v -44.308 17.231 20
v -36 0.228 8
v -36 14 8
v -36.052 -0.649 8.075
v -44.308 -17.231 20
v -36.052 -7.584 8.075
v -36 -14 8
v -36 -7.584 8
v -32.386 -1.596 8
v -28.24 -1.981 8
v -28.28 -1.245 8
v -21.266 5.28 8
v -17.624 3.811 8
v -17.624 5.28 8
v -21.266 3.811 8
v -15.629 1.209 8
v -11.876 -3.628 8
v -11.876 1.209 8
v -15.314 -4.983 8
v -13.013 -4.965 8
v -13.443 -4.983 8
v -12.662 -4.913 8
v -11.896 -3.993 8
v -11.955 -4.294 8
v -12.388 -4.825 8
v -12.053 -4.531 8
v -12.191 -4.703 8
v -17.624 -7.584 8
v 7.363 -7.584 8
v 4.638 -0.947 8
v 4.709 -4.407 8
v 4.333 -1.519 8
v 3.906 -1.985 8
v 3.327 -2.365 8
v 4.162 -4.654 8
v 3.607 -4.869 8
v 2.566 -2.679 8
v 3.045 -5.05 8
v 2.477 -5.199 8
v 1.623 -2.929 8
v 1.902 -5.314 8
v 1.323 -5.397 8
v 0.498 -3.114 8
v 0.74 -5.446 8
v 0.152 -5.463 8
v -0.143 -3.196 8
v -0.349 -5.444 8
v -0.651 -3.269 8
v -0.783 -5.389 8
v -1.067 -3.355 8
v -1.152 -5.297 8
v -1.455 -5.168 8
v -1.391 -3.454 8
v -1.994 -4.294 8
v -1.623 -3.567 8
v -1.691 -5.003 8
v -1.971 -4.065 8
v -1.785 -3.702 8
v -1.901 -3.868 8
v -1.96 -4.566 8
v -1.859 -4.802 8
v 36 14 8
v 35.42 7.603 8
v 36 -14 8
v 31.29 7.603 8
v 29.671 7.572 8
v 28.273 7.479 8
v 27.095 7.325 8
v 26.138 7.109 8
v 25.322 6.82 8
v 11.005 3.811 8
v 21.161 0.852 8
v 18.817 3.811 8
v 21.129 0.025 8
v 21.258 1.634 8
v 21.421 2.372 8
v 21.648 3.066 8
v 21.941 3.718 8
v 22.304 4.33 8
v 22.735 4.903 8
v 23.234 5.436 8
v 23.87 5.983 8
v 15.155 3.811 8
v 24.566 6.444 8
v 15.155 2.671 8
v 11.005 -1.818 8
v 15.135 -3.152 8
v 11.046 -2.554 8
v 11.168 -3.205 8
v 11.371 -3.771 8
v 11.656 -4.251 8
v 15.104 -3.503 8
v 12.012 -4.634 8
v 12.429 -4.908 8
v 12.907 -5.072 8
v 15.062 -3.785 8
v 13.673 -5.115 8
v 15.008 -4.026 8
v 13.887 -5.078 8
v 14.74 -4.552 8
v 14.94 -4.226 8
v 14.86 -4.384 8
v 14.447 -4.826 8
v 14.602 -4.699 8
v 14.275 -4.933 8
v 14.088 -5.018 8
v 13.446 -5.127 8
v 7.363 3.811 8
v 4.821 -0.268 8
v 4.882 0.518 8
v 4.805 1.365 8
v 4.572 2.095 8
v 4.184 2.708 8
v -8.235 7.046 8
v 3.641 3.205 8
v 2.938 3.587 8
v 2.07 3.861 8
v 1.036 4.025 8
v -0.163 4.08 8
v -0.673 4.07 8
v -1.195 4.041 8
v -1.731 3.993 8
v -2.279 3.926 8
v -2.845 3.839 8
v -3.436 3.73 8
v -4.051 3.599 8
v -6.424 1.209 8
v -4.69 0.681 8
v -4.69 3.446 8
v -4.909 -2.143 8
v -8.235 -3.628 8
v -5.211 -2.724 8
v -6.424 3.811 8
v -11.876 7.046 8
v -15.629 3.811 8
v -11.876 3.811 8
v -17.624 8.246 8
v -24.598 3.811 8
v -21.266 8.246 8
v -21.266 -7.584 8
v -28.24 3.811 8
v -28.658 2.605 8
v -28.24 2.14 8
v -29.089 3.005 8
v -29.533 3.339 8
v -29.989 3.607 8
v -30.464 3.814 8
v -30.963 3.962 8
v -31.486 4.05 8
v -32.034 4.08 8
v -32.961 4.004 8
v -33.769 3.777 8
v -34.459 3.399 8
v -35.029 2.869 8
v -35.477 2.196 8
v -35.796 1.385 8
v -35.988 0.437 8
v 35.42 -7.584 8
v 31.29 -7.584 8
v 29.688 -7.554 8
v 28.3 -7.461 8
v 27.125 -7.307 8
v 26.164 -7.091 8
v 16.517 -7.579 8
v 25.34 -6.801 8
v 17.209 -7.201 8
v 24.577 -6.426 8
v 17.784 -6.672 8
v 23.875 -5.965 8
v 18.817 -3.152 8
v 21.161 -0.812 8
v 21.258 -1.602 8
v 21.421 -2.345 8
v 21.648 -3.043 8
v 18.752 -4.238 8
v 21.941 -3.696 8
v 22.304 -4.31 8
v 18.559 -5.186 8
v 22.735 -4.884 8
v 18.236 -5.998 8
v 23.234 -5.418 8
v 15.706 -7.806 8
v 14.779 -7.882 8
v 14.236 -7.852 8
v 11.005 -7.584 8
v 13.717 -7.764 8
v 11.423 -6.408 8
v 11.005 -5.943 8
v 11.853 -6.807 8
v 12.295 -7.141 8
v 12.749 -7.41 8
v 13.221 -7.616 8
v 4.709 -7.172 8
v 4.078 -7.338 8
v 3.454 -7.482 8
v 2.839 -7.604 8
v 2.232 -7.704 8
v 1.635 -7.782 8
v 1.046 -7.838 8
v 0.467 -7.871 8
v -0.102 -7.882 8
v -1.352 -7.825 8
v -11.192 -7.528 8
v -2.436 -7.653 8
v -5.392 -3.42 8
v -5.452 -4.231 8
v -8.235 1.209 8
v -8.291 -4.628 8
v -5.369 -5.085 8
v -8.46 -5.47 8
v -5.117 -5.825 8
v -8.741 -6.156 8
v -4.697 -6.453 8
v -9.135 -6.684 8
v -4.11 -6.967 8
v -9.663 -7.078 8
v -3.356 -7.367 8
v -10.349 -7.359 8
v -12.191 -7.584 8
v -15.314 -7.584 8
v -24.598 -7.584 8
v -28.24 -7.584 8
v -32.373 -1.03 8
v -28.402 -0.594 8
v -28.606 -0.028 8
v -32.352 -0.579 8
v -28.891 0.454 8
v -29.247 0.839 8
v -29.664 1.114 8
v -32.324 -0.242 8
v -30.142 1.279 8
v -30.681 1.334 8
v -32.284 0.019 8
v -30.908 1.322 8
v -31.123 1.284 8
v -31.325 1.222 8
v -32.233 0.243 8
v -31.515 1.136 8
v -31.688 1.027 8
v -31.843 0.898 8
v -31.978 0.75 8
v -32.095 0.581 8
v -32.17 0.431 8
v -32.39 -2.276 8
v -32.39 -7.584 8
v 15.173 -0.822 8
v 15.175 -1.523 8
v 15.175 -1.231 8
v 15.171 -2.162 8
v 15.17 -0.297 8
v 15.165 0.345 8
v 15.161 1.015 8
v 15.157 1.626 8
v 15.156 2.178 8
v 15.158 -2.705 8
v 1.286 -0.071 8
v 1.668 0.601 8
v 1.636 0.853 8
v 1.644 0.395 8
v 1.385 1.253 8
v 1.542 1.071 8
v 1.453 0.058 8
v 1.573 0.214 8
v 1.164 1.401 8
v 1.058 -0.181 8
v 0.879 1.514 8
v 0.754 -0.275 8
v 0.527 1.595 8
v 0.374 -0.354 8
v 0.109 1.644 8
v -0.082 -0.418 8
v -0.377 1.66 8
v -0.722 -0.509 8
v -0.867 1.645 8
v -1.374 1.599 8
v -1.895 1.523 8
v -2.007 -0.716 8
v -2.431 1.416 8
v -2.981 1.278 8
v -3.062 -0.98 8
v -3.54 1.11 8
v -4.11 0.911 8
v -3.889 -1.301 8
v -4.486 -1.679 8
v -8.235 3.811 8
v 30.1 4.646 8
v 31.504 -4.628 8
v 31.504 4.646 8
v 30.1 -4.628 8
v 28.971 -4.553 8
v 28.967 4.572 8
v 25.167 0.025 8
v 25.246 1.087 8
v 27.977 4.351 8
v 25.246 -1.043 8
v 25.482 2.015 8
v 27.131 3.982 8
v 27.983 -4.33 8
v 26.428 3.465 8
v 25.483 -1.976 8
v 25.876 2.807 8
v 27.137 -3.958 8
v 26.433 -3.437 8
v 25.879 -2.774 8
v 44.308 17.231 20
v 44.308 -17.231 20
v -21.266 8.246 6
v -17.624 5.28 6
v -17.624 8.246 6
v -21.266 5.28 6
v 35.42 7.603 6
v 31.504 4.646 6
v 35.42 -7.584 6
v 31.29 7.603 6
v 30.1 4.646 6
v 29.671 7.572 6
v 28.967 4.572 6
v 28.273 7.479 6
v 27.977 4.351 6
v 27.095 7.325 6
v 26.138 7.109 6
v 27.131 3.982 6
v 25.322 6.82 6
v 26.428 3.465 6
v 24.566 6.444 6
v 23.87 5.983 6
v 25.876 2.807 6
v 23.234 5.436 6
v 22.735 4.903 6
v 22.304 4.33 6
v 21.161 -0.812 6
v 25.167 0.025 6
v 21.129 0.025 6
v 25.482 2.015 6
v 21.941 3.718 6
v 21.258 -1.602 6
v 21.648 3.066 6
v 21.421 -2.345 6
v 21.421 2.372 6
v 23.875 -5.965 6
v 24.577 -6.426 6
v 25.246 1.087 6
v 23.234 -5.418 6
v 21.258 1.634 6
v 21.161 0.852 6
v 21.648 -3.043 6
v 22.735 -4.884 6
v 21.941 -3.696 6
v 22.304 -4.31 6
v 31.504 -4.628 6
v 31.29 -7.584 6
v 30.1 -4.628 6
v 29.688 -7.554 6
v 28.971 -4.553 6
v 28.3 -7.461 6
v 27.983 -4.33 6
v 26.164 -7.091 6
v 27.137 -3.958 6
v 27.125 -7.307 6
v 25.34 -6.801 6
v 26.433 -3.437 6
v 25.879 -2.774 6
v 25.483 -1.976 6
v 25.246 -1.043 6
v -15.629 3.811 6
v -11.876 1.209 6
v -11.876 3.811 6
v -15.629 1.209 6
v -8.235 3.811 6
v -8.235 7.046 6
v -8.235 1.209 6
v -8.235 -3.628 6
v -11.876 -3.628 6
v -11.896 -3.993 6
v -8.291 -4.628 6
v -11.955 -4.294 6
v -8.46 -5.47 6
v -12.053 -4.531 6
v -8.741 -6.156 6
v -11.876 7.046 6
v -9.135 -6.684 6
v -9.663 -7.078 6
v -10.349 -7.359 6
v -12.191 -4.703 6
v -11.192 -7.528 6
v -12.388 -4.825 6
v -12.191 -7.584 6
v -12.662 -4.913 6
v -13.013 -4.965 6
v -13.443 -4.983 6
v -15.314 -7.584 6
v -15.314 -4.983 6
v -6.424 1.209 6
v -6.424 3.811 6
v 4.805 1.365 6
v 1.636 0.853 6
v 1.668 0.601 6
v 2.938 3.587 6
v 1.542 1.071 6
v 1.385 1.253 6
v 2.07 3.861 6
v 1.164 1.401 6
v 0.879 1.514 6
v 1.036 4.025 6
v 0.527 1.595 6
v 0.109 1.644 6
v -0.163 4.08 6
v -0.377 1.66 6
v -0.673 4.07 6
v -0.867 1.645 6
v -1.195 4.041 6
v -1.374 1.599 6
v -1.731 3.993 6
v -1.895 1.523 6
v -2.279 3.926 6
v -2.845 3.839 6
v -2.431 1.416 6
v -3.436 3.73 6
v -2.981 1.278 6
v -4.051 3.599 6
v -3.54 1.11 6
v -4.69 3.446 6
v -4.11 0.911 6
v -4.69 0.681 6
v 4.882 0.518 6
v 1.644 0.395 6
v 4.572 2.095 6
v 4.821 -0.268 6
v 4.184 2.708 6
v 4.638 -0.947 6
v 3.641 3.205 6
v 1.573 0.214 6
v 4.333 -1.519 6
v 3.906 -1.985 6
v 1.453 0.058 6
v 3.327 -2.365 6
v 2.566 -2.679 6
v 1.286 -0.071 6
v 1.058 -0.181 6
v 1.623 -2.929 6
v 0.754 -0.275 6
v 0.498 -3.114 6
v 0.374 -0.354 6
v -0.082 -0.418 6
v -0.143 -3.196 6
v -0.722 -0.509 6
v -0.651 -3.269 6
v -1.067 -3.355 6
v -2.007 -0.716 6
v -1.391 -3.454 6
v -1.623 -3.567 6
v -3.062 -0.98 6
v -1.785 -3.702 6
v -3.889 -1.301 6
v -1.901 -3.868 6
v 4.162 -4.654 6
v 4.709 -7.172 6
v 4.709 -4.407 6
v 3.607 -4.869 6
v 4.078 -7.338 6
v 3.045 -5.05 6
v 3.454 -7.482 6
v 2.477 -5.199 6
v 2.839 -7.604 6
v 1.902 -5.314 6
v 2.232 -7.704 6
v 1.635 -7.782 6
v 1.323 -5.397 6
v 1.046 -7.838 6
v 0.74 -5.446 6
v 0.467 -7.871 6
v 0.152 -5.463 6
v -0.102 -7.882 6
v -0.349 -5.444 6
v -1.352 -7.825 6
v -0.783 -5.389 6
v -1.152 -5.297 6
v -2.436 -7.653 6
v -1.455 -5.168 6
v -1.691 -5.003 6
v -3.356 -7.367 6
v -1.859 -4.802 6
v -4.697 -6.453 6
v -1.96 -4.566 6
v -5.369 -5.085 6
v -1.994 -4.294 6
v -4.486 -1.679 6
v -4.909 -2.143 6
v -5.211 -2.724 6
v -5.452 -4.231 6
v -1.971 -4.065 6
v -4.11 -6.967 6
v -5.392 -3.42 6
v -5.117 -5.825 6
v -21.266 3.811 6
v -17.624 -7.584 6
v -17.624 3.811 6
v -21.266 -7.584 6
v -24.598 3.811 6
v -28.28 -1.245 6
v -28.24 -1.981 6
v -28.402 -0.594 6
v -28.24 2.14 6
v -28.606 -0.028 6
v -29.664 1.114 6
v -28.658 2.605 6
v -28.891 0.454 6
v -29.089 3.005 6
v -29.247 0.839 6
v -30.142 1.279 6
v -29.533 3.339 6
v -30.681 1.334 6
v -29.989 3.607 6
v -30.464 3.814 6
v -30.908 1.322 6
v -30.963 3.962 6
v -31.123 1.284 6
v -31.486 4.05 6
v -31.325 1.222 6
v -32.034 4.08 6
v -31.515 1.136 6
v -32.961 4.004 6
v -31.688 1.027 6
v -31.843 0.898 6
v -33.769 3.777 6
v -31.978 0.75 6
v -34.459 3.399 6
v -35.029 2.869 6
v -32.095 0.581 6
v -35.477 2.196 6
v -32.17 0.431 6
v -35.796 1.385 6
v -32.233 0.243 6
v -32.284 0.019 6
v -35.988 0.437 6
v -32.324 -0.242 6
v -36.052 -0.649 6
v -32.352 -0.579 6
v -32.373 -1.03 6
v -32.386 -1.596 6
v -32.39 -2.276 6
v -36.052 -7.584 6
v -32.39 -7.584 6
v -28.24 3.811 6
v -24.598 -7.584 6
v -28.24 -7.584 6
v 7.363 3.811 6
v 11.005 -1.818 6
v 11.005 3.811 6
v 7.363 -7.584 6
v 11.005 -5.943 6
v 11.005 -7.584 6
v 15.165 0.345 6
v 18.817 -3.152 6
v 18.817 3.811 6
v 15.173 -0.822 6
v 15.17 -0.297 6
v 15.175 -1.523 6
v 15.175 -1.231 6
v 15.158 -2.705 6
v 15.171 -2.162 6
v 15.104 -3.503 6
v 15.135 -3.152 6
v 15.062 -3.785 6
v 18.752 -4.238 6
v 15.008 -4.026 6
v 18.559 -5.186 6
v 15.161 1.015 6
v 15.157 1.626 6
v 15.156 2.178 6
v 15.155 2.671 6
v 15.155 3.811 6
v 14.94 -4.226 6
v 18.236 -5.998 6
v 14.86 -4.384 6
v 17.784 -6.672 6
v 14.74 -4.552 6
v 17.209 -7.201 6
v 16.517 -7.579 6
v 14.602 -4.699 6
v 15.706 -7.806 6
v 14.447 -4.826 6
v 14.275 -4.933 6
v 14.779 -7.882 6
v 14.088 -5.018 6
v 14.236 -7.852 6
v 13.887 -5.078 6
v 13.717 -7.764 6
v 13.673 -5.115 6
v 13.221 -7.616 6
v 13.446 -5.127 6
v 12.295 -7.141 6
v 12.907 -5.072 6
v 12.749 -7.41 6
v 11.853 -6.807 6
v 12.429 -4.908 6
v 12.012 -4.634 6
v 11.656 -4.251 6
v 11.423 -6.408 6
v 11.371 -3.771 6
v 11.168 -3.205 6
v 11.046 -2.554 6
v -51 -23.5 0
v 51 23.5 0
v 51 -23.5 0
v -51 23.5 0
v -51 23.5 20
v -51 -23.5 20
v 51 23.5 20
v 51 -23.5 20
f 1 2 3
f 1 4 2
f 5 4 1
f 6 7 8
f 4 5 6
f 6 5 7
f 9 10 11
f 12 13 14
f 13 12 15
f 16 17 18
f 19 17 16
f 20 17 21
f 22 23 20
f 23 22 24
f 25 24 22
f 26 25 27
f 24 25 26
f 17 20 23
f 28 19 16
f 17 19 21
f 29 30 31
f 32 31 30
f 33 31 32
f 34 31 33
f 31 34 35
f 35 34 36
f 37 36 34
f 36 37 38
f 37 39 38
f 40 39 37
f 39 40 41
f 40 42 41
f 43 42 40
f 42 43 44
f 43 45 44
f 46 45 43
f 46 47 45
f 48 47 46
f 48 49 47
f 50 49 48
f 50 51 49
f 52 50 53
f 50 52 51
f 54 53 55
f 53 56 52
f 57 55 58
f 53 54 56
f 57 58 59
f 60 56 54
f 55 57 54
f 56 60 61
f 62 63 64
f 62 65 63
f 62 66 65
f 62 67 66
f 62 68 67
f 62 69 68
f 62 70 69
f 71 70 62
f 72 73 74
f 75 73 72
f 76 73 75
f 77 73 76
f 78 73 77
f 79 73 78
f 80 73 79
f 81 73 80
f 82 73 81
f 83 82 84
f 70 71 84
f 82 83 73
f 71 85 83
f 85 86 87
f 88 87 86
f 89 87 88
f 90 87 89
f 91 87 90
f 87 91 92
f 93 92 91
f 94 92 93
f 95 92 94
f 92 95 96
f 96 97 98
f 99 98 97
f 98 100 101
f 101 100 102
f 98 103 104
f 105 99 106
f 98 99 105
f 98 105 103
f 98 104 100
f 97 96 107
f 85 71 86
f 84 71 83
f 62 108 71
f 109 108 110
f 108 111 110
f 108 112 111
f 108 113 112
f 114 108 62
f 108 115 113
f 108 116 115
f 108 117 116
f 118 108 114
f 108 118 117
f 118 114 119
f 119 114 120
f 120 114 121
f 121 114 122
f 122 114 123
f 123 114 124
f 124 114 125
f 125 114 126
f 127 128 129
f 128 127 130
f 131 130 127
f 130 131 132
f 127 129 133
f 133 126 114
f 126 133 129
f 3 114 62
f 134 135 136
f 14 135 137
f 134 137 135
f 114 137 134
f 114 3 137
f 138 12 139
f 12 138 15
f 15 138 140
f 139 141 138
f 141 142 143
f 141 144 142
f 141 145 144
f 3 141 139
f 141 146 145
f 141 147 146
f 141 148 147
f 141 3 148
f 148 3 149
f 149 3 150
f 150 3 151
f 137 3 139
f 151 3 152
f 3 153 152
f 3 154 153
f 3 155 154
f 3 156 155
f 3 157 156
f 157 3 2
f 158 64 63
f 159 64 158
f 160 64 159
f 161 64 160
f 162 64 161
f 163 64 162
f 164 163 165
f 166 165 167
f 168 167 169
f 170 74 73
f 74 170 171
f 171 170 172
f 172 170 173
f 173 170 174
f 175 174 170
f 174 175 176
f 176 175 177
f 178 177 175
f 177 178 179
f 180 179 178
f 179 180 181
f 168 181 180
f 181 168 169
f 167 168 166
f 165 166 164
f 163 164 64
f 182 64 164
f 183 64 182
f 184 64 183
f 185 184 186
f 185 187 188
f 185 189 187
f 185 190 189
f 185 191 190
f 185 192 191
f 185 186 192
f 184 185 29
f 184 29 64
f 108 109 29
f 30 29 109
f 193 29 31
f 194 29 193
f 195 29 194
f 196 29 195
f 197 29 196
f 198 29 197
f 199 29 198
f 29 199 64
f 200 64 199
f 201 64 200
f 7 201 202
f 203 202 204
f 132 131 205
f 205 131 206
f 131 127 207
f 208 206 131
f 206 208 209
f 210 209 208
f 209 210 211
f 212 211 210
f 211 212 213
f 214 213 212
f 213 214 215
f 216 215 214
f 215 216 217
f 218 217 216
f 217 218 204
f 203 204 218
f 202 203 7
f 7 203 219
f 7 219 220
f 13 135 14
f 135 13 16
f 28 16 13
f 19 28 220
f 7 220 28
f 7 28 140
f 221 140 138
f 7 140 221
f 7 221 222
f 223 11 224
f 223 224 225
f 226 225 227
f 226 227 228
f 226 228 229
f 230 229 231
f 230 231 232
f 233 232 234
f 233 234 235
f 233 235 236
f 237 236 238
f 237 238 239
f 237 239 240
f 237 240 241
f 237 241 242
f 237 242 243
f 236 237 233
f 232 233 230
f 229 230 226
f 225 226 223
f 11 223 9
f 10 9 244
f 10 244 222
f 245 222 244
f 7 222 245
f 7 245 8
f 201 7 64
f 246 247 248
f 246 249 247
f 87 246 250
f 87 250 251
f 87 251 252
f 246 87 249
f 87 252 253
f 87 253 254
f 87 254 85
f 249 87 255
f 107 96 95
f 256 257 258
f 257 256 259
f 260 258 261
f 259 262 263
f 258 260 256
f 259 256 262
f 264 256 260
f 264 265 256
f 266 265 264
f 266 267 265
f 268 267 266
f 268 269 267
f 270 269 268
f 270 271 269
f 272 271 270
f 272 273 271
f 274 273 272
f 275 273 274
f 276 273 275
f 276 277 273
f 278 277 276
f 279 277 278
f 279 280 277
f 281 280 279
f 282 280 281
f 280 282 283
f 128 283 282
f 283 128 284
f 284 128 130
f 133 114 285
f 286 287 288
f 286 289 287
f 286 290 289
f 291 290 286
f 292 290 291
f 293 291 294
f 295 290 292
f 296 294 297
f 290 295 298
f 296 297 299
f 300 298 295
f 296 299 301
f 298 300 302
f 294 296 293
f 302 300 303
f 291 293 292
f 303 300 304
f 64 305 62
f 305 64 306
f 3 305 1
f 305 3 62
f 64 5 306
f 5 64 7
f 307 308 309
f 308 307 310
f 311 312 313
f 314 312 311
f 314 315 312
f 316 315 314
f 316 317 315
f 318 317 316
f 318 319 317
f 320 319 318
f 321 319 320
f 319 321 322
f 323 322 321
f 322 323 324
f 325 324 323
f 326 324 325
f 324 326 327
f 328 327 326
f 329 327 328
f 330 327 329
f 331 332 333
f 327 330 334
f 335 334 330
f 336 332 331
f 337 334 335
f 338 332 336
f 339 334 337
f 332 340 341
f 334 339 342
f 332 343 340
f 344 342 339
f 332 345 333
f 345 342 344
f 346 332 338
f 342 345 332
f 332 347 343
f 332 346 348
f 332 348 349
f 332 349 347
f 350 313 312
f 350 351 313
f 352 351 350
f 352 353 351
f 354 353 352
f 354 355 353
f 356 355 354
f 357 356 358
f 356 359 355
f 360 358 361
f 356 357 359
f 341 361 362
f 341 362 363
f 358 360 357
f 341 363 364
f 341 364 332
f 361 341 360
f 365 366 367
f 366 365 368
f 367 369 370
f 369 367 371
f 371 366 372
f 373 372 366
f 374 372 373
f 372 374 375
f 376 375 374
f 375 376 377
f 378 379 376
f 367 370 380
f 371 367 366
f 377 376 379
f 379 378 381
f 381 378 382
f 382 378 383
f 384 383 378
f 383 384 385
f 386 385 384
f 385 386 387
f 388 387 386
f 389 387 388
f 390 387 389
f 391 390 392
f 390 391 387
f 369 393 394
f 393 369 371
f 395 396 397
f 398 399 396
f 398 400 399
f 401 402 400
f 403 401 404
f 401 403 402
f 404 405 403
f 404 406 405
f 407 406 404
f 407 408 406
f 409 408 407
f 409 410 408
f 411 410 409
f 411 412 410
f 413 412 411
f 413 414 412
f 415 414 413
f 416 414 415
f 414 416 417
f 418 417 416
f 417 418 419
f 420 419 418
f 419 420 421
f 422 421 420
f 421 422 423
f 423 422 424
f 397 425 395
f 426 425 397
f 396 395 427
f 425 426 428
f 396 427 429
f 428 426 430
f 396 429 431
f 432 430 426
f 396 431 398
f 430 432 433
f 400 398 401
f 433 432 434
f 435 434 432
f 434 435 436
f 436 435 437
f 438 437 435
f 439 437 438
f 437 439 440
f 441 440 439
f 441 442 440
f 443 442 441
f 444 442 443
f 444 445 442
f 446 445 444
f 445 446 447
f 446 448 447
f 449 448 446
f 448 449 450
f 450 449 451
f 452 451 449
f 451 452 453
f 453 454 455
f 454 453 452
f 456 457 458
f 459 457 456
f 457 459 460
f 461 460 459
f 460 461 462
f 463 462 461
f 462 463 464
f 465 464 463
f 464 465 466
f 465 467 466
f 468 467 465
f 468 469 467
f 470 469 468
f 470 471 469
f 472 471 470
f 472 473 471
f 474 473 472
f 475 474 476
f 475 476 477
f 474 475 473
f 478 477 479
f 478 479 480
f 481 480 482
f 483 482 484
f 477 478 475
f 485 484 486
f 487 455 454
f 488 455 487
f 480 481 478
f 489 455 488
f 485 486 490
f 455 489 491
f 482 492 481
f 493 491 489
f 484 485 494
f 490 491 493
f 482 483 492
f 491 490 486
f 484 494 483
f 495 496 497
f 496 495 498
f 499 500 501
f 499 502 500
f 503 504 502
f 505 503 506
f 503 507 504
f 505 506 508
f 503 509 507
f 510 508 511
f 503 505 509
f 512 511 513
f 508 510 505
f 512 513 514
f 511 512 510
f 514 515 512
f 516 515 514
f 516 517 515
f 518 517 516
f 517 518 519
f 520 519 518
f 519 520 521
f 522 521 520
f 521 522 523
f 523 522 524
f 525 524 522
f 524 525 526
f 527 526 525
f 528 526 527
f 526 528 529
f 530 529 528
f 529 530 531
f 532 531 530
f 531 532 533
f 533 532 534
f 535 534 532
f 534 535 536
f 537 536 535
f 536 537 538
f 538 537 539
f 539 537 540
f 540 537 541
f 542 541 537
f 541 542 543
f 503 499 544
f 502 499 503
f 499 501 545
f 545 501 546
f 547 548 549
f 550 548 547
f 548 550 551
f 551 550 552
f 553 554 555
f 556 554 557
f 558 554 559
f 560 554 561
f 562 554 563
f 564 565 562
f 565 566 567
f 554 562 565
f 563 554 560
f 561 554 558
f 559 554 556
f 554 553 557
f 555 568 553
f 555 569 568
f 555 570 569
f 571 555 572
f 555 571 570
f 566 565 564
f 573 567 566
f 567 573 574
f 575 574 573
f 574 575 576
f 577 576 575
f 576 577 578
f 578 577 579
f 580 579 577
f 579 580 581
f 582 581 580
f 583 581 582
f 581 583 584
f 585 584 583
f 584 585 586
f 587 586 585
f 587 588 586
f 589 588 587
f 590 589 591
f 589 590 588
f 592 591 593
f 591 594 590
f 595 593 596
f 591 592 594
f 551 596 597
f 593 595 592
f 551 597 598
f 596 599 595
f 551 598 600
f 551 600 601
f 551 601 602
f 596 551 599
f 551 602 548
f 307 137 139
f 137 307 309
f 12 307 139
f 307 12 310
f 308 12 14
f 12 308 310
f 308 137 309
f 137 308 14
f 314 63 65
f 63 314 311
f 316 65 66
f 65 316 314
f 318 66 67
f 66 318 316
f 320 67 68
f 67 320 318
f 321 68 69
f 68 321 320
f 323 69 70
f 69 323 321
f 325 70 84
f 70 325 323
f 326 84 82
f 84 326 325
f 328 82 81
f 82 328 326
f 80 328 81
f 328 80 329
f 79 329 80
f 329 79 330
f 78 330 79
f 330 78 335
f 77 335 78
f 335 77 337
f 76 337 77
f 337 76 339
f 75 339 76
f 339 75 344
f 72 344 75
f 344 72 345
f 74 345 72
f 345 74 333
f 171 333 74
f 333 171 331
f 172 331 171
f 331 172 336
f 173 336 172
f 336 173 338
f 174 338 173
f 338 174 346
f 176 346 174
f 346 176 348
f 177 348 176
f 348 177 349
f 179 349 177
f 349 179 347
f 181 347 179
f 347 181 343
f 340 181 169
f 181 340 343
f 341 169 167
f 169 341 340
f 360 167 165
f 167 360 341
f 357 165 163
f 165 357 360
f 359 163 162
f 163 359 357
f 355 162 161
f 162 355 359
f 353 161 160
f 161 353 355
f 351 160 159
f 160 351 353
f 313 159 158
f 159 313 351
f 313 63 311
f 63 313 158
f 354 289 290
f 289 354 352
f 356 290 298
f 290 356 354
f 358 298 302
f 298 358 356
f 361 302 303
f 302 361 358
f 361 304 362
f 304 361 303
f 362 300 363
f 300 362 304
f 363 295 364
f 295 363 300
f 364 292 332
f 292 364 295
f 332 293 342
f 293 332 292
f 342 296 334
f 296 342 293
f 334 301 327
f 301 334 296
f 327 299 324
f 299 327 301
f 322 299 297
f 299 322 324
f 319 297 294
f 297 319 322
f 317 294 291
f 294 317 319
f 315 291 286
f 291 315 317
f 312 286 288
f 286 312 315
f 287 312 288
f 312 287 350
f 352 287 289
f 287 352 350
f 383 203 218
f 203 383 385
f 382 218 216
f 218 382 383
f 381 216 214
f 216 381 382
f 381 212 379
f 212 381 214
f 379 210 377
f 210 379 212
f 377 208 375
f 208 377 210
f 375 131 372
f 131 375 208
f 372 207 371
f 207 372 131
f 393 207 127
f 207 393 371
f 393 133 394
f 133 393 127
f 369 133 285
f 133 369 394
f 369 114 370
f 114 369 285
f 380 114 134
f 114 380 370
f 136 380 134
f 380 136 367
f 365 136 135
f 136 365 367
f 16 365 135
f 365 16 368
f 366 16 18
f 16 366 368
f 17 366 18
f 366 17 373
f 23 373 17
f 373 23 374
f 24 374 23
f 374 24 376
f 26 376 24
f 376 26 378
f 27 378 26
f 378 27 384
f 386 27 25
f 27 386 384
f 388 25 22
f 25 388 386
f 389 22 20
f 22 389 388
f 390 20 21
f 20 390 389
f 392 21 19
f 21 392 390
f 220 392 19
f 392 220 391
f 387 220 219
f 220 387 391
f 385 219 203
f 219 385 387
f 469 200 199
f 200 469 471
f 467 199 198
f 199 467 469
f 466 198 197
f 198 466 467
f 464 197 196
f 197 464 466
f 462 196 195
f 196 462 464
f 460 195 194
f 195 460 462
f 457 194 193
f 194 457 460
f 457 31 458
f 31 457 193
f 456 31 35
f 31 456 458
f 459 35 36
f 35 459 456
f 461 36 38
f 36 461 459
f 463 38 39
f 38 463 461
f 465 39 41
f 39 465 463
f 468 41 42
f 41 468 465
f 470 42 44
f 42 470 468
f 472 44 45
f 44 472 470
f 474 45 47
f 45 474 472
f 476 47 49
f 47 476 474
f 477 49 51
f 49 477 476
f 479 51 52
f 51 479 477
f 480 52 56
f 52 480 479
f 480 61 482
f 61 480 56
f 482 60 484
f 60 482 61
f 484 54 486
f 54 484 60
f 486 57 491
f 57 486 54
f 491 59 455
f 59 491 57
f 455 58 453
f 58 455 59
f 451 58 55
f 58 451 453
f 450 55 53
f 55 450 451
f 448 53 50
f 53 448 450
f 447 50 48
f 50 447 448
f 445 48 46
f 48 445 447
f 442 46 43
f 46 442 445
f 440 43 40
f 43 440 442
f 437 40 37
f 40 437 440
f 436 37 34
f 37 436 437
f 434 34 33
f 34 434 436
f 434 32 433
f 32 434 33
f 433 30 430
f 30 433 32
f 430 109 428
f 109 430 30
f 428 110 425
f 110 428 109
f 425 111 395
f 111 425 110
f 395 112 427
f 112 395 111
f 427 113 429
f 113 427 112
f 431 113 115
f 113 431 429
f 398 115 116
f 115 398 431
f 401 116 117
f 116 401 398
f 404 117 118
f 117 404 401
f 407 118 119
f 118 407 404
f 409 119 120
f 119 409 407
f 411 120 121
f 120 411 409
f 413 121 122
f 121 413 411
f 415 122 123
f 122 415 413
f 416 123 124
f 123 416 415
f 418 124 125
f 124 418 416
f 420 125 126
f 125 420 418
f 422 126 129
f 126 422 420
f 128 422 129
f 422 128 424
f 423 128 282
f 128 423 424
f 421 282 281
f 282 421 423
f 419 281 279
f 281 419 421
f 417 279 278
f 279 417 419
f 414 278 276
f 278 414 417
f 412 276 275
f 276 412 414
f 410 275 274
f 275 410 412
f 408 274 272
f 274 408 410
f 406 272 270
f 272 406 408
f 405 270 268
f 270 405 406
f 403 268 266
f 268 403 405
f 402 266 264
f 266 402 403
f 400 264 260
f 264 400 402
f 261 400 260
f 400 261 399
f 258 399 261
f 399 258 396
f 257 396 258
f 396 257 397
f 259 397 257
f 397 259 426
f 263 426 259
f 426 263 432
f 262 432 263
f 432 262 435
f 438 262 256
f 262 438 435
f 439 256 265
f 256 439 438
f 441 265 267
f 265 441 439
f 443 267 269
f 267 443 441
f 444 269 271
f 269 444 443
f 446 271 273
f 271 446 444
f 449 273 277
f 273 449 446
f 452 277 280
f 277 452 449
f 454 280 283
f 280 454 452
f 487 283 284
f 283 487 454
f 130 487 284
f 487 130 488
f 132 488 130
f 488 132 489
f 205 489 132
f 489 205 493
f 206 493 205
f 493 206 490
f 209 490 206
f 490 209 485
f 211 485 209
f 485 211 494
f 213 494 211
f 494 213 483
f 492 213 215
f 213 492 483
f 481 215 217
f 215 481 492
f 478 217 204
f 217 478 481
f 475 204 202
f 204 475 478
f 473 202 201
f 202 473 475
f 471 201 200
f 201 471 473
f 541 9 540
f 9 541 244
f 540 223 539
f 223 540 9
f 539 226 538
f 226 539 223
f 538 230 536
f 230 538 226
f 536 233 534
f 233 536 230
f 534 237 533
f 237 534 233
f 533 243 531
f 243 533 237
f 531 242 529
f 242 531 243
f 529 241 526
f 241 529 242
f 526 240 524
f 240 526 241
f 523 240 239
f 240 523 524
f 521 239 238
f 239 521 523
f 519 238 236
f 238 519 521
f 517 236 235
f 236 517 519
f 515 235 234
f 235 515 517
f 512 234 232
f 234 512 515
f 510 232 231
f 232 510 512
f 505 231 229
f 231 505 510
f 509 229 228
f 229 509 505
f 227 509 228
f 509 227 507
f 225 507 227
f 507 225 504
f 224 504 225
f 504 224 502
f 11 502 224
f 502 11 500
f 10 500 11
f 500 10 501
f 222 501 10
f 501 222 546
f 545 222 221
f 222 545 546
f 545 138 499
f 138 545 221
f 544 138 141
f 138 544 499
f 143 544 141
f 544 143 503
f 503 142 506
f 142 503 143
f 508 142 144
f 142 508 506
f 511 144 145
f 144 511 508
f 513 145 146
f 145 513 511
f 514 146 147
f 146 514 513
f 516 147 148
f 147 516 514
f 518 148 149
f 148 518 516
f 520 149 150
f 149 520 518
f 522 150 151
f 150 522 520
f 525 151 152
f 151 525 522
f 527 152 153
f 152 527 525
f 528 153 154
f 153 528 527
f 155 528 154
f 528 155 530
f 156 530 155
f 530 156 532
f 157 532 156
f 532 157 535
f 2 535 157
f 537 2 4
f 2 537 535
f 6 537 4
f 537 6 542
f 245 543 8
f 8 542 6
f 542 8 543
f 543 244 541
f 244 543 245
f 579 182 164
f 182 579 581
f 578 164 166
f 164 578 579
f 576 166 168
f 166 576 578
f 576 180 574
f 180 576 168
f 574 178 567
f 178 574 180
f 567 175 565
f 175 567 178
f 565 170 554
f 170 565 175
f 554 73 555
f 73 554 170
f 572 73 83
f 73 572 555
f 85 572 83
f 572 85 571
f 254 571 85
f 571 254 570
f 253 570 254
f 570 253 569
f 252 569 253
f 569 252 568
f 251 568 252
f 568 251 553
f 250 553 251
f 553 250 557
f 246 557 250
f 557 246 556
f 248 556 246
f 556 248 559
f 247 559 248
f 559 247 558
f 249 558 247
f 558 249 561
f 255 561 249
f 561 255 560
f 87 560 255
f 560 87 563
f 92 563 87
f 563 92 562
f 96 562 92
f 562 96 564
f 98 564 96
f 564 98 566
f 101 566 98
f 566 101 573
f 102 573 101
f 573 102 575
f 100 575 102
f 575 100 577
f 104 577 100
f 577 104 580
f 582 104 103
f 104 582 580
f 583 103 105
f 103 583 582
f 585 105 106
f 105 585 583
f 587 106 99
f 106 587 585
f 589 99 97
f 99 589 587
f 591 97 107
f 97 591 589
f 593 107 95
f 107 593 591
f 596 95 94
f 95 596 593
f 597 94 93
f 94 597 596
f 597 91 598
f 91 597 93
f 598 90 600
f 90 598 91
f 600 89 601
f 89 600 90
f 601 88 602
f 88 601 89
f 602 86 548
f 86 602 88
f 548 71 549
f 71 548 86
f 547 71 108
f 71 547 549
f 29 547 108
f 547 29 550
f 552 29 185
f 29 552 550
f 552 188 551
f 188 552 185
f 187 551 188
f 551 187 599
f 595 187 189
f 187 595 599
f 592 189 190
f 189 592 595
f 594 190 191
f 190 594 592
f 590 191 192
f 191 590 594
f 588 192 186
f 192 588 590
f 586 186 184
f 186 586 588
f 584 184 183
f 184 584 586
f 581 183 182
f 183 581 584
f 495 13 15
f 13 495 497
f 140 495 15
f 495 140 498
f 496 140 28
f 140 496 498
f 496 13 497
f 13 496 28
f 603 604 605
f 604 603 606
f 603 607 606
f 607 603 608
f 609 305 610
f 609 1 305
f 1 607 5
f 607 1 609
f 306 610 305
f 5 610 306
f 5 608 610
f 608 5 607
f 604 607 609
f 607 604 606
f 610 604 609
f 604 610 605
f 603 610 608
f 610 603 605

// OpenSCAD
labelString = "Dustin";
fast        = 1;   // [0:Smoothed Text, 1:Fast Render]
pourHeight  = 35;  // [5:1:200]
pourWidth   = 90;  // [5:1:300]
pourThick   = 12;  // [1:1:150]
taper       = 0.8; // [0.1:0.01:1.0]
labelDepth  = 2;   // [0.5:0.1:25]
labelSmooth = 0.5; // [0.2:0.1:2.0]
fontSize    = 15;  // [2:1:80]
moldWall    = 6;   // [1:1:12]
moldWidth   = pourWidth  + moldWall*2;
moldHeight  = pourHeight + moldWall*2;
floorThick  = moldWall   + labelDepth;
moldThick   = pourThick  + floorThick;
texDepth    = 2*1;
texLine     = 1*1;
texC2C      = 8*1;
texWidth    = texC2C/sin(60)-texLine;
extra       = 1*1;

difference()
  { moldBlock();
    union()
      { pourCavity();
        if ( fast > 0.5 )
          fastLetters();
        if ( fast <= 0.5 )
          { letters();
            texture();
          }
      }
  }

module pourCavity()
{ translate( [0,0,floorThick] )
    linear_extrude( height=pourThick+extra, scale=1/taper )
      translate( [-pourWidth*taper/2,-pourHeight*taper/2] )
        square( [pourWidth*taper,pourHeight*taper] );
}

module moldBlock()
{ translate( [-moldWidth/2,-moldHeight/2] )
    linear_extrude( moldThick )
      square( [moldWidth,moldHeight] );
}

module letters()
{ font1 = "Baloo Bhai:style=Bold"; // here you can select other font type
  $fn=8;
  translate( [0,0,moldWall] )
    minkowski()
      { linear_extrude( height=(labelDepth+extra-labelSmooth) )
          fillet( labelSmooth )
            rounding( labelSmooth )
              rotate( [0,180,0] )
                text( labelString, font = font1, size = fontSize, direction = "ltr", spacing = 1, halign="center", valign="center" );
          
        sphere( labelSmooth );
      }
}

module fastLetters()
{ font1 = "Baloo Bhai:style=Bold"; // here you can select other font type
  translate( [0,0,moldWall] )
    linear_extrude( height=(labelDepth+extra-labelSmooth) )
      rotate( [0,180,0] )
        text( labelString, font = font1, size = fontSize, direction = "ltr", spacing = 1, halign="center", valign="center" );
}

// Waffle like cuts to make removal from build plate easier
module texture()
{ wid = moldWidth;
  hei = moldHeight;
  translate( [-wid/2,-hei/2] )
  {  
  vo = sin(60)*2;
  for ( i = [wid/2:texC2C:wid] )
    for ( j = [0:texC2C*vo:hei+texC2C*vo] )
      translate( [i,j,0] )
        textureCone( texDepth );
  for ( i = [wid/2+texC2C/2:texC2C:wid] )
    for ( j = [texC2C*vo/2:texC2C*vo:hei+texC2C*vo] )
      translate( [i,j,0] )
        textureCone( texDepth );
    
  for ( i = [wid/2:-texC2C:0] )
    for ( j = [0:texC2C*vo:hei+texC2C*vo] )
      translate( [i,j,0] )
        textureCone( texDepth );
  for ( i = [wid/2-texC2C/2:-texC2C:0] )
    for ( j = [texC2C*vo/2:texC2C*vo:hei+texC2C*vo] )
      translate( [i,j,0] )
        textureCone( texDepth );
  }
}

module textureCone( h=1 )
{ translate( [0,0,-0.001] )
    linear_extrude( height=h,scale=0.5 )
      polygon(points=[[cos(030)*texWidth/2,sin(030)*texWidth/2 ],
                      [cos(090)*texWidth/2,sin(090)*texWidth/2 ],
                      [cos(150)*texWidth/2,sin(150)*texWidth/2 ],
                      [cos(210)*texWidth/2,sin(210)*texWidth/2 ],
                      [cos(270)*texWidth/2,sin(270)*texWidth/2 ],
                      [cos(330)*texWidth/2,sin(330)*texWidth/2 ]],
              paths =[[0,1,2,3,4,5,0]] );
    
}

// Copyright (c) 2013 Oskar Linde. All rights reserved.
// License: BSD
//
// This library contains basic 2D morphology operations
//
// outset(d=1)            - creates a polygon at an offset d outside a 2D shape
// inset(d=1)             - creates a polygon at an offset d inside a 2D shape
// fillet(r=1)            - adds fillets of radius r to all concave corners of a 2D shape
// rounding(r=1)          - adds rounding to all convex corners of a 2D shape
// shell(d,center=false)  - makes a shell of width d along the edge of a 2D shape
//                        - positive values of d places the shell on the outside
//                        - negative values of d places the shell on the inside
//                        - center=true and positive d places the shell centered on the edge

module outset(d=1) {
	// Bug workaround for older OpenSCAD versions
	if (version_num() < 20130424) render() outset_extruded(d) children();
	else minkowski() {
		circle(r=d);
		children();
	}
}

module outset_extruded(d=1) {
   projection(cut=true) minkowski() {
        cylinder(r=d);
        linear_extrude(center=true) children();
   }
}

module inset(d=1) {
	 render() inverse() outset(d=d) inverse() children();
}

module fillet(r=1) {
	inset(d=r) render() outset(d=r) children();
}

module rounding(r=1) {
	outset(d=r) inset(d=r) children();
}

module shell(d,center=false) {
	if (center && d > 0) {
		difference() {
			outset(d=d/2) children();
			inset(d=d/2) children();
		}
	}
	if (!center && d > 0) {
		difference() {
			outset(d=d) children();
			children();
		}
	}
	if (!center && d < 0) {
		difference() {
			children();
			inset(d=-d) children();
		}
	}
	if (d == 0) children();
}


// Below are for internal use only

module inverse() {
	difference() {
		square(1e5,center=true);
		children();
	}
}
